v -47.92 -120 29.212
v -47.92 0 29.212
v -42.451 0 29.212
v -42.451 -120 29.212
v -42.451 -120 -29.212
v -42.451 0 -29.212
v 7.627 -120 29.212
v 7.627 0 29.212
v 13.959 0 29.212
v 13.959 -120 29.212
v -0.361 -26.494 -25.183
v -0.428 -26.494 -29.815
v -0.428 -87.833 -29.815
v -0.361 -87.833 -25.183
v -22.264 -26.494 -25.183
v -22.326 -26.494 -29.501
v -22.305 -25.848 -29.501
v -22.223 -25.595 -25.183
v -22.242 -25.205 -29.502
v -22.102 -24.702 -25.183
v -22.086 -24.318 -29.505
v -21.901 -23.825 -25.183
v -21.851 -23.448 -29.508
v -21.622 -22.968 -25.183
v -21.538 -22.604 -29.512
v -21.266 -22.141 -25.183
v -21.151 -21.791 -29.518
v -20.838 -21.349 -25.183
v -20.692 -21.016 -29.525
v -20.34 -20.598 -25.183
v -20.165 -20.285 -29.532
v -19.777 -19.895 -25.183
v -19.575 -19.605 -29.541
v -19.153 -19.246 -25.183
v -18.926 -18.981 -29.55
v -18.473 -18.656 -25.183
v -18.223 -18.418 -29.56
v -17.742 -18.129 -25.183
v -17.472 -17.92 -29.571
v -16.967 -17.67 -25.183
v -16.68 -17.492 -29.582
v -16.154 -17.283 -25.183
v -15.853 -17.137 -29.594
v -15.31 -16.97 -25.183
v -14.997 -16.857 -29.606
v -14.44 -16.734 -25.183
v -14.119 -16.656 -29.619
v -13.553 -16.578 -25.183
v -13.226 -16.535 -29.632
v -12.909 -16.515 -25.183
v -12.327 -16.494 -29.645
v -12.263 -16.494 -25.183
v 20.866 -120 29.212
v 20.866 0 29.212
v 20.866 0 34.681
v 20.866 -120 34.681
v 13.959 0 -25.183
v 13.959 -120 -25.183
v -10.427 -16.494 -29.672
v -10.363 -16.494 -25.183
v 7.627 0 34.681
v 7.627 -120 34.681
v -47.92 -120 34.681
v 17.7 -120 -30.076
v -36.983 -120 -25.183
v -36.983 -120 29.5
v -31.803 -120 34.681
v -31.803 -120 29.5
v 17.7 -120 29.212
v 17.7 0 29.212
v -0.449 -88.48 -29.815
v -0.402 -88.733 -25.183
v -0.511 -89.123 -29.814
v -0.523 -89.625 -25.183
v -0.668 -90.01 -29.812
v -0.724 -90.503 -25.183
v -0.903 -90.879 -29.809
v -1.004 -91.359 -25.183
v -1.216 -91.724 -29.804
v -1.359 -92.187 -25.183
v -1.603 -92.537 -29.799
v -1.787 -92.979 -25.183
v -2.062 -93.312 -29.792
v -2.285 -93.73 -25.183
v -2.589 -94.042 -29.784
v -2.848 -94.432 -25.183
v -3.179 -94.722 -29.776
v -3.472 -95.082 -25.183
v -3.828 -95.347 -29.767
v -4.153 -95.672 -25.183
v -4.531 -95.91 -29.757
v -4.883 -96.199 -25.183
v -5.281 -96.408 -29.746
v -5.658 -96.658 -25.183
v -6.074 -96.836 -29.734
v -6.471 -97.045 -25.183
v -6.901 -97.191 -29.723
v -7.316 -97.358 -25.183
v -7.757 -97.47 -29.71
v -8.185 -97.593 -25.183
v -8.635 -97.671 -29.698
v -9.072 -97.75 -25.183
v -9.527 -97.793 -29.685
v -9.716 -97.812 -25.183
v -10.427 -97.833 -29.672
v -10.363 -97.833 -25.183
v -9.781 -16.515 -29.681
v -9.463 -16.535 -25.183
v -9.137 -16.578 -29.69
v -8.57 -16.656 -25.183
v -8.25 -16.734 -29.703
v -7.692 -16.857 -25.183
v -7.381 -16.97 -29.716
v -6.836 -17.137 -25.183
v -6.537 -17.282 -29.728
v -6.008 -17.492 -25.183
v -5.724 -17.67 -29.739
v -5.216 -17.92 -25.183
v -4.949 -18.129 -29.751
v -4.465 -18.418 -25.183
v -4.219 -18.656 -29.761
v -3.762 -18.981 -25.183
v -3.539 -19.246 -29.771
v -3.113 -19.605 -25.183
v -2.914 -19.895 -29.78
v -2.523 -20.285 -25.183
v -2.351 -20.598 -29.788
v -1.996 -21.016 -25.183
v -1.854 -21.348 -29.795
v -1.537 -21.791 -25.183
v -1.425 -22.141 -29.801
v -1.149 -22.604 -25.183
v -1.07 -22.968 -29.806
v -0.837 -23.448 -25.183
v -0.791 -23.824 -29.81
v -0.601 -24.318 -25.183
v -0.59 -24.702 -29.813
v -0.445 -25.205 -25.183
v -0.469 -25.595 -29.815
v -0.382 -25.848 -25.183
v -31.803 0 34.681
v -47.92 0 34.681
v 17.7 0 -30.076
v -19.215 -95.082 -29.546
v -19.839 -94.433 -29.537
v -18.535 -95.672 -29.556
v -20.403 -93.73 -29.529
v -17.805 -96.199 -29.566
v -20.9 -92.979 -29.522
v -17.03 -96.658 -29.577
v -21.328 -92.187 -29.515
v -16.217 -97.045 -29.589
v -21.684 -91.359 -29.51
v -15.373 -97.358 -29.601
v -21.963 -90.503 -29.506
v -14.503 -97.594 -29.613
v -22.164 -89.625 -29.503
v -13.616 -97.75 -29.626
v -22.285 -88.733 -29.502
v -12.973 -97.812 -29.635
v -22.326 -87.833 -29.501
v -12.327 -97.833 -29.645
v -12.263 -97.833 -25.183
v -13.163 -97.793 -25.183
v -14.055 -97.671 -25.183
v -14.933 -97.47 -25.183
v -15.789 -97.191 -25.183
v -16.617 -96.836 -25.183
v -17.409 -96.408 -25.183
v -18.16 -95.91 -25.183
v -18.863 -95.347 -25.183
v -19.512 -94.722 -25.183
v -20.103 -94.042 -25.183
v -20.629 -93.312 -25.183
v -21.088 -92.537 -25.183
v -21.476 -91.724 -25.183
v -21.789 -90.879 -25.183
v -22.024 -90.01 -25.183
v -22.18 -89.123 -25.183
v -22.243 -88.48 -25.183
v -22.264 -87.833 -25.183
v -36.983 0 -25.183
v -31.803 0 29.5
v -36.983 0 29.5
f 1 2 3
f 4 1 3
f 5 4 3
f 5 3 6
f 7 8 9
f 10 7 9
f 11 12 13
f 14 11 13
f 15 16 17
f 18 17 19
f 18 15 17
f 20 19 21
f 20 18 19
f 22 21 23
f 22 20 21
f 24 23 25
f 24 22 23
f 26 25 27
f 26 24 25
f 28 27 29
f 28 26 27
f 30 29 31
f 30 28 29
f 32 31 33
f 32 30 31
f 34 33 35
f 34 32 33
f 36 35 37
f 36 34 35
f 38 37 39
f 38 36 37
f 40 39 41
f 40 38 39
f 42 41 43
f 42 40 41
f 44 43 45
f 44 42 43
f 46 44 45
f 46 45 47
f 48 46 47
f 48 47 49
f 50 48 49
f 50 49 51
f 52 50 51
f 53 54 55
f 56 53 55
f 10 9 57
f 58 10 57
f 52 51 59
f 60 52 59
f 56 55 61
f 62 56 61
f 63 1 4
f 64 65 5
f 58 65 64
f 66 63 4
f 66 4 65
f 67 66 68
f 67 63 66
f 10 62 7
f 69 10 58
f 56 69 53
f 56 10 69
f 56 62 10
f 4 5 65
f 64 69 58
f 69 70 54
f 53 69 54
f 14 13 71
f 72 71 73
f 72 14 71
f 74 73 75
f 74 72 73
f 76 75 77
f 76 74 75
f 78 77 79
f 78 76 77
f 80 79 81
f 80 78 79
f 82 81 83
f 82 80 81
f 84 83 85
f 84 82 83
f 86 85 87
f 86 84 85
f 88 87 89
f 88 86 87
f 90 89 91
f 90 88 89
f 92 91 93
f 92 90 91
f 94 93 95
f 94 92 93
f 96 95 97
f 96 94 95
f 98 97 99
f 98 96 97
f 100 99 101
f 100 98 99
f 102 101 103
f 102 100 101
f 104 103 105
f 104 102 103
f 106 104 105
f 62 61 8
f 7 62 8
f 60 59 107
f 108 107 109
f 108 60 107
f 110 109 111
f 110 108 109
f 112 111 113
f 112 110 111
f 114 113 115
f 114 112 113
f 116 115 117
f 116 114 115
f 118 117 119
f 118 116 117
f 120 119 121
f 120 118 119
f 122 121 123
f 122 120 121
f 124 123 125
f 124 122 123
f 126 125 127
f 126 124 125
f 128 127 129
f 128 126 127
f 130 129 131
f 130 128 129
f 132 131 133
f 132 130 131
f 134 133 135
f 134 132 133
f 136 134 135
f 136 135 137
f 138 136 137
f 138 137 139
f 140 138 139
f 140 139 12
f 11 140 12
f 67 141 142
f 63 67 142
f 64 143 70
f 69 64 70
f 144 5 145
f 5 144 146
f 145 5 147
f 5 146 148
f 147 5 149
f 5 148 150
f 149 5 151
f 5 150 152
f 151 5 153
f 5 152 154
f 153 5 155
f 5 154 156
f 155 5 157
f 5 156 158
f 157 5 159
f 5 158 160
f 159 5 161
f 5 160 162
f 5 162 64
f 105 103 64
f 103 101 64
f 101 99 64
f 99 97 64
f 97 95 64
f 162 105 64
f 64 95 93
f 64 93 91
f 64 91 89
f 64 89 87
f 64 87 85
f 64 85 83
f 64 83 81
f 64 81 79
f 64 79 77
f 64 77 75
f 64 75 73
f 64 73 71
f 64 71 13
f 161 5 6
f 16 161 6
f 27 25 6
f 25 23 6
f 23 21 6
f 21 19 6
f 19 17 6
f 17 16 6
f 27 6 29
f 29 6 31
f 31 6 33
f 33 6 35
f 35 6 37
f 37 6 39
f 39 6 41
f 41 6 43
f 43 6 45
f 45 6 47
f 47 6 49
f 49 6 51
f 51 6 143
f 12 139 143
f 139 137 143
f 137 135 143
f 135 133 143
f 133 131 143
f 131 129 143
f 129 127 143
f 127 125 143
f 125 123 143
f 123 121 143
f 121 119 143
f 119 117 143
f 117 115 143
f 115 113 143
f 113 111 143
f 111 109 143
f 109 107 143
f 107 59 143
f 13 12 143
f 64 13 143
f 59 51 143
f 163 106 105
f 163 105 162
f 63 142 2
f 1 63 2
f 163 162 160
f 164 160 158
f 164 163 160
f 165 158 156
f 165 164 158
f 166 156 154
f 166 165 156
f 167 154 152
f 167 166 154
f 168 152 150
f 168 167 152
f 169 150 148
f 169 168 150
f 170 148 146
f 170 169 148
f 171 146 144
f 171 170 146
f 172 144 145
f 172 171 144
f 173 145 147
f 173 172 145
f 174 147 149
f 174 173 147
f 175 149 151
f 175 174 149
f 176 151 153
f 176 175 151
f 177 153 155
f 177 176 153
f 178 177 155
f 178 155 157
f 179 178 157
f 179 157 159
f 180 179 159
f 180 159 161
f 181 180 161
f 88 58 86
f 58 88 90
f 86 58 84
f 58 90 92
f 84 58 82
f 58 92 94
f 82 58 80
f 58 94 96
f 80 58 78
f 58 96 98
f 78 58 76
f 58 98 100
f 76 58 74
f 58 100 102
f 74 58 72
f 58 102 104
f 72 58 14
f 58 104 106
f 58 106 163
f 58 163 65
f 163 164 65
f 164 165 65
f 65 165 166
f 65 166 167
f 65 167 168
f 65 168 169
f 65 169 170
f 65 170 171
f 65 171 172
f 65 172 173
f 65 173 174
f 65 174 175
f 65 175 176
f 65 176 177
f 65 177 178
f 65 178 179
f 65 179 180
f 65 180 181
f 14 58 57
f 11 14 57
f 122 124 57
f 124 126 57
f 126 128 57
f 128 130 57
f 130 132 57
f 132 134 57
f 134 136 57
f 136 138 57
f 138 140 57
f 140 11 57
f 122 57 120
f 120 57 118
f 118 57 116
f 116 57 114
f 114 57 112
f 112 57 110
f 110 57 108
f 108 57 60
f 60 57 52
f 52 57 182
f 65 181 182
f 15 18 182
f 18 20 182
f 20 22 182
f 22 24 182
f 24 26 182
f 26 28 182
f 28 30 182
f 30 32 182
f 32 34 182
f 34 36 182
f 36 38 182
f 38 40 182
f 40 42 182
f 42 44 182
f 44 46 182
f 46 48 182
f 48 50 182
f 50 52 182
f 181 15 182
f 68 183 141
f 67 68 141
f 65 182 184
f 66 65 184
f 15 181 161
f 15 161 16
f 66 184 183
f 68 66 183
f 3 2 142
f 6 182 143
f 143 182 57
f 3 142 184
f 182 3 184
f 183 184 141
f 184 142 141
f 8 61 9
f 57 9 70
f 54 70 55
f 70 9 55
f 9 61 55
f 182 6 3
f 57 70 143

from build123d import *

# Parameters (mm, degrees)
F1_DEPTH = 120
F3_DEPTH = 25
F4_DEPTH = 25


with BuildPart() as f1:
    # F0 (on Front) → F1 (new body)
    with BuildSketch(Plane.XZ):
        Polygon((-31.802535, 29.50009), (-31.802535, 34.680594), (-47.919657, 34.680594), (-47.919657, 29.212285), (-42.451348, 29.212285), (-42.451348, -29.212285), (17.700056, -30.075703), (17.700056, 29.212285), (20.865917, 29.212285), (20.865917, 34.680594), (7.626853, 34.680594), (7.626853, 29.212285), (13.958578, 29.212285), (13.958578, -25.183003), (-36.983039, -25.183003), (-36.983039, 29.50009), align=None)
    extrude(amount=F1_DEPTH)

    # F2 (on face) → F3 (cut)
    with BuildSketch(Plane(origin=(-0.427974, 0, -29.815492), x_dir=(0.999897, 0, -0.014353), z_dir=(-0.014353, 0, -0.999897))):
        with BuildLine():
            Line((-10, 97.833304), (-11.900108, 97.833304))
            ThreePointArc((-11.900108, 97.833304), (-18.971176, 94.904371), (-21.900108, 87.833304))
            Line((-21.900108, 87.833304), (-21.900108, 26.494442))
            ThreePointArc((-21.900108, 26.494442), (-18.971176, 19.423374), (-11.900108, 16.494442))
            Line((-11.900108, 16.494442), (-10, 16.494442))
            ThreePointArc((-10, 16.494442), (-2.928932, 19.423374), (0, 26.494442))
            Line((0, 26.494442), (0, 87.833304))
            ThreePointArc((0, 87.833304), (-2.928932, 94.904371), (-10, 97.833304))
        make_face()
    extrude(amount=F3_DEPTH, mode=Mode.SUBTRACT)

    # F2 (on face) → F4 (cut)
    with BuildSketch(Plane(origin=(-0.427974, 0, -29.815492), x_dir=(0.999897, 0, -0.014353), z_dir=(-0.014353, 0, -0.999897))):
        with BuildLine():
            Line((-10, 97.833304), (-11.900108, 97.833304))
            ThreePointArc((-11.900108, 97.833304), (-18.971176, 94.904371), (-21.900108, 87.833304))
            Line((-21.900108, 87.833304), (-21.900108, 26.494442))
            ThreePointArc((-21.900108, 26.494442), (-18.971176, 19.423374), (-11.900108, 16.494442))
            Line((-11.900108, 16.494442), (-10, 16.494442))
            ThreePointArc((-10, 16.494442), (-2.928932, 19.423374), (0, 26.494442))
            Line((0, 26.494442), (0, 87.833304))
            ThreePointArc((0, 87.833304), (-2.928932, 94.904371), (-10, 97.833304))
        make_face()
    extrude(amount=-F4_DEPTH, mode=Mode.SUBTRACT)


solid = f1.part
